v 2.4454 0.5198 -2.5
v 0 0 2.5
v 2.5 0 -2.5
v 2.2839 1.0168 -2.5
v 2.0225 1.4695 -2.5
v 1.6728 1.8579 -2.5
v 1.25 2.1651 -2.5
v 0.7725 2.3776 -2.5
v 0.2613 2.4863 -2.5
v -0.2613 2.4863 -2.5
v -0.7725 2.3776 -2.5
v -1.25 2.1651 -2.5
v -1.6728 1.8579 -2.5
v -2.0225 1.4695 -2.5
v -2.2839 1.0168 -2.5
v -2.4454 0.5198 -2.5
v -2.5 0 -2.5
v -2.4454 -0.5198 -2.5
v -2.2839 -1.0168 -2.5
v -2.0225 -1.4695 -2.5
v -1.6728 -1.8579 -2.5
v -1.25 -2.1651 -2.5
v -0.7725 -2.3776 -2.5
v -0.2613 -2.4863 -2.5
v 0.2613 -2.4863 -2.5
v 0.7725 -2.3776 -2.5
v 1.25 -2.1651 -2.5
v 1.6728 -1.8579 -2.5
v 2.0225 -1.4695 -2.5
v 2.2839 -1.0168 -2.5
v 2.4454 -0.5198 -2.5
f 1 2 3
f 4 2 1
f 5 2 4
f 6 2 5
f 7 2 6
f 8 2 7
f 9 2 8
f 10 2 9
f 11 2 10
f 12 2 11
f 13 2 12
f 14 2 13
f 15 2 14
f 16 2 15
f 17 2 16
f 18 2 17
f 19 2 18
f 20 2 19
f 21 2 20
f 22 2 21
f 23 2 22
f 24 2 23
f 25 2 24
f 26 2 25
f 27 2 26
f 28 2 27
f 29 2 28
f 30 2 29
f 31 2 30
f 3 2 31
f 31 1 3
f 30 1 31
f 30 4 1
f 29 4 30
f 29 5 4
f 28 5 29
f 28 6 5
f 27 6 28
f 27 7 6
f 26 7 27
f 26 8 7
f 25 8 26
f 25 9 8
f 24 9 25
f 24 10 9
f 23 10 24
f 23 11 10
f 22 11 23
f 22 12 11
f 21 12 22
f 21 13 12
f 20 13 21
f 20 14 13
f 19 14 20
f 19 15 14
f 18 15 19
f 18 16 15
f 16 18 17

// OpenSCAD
color("CornflowerBlue")cylinder($fn = 30, $fa = 1, $fs = 1, h = 5, r1 = 2.5, r2 = 0, center = true);
